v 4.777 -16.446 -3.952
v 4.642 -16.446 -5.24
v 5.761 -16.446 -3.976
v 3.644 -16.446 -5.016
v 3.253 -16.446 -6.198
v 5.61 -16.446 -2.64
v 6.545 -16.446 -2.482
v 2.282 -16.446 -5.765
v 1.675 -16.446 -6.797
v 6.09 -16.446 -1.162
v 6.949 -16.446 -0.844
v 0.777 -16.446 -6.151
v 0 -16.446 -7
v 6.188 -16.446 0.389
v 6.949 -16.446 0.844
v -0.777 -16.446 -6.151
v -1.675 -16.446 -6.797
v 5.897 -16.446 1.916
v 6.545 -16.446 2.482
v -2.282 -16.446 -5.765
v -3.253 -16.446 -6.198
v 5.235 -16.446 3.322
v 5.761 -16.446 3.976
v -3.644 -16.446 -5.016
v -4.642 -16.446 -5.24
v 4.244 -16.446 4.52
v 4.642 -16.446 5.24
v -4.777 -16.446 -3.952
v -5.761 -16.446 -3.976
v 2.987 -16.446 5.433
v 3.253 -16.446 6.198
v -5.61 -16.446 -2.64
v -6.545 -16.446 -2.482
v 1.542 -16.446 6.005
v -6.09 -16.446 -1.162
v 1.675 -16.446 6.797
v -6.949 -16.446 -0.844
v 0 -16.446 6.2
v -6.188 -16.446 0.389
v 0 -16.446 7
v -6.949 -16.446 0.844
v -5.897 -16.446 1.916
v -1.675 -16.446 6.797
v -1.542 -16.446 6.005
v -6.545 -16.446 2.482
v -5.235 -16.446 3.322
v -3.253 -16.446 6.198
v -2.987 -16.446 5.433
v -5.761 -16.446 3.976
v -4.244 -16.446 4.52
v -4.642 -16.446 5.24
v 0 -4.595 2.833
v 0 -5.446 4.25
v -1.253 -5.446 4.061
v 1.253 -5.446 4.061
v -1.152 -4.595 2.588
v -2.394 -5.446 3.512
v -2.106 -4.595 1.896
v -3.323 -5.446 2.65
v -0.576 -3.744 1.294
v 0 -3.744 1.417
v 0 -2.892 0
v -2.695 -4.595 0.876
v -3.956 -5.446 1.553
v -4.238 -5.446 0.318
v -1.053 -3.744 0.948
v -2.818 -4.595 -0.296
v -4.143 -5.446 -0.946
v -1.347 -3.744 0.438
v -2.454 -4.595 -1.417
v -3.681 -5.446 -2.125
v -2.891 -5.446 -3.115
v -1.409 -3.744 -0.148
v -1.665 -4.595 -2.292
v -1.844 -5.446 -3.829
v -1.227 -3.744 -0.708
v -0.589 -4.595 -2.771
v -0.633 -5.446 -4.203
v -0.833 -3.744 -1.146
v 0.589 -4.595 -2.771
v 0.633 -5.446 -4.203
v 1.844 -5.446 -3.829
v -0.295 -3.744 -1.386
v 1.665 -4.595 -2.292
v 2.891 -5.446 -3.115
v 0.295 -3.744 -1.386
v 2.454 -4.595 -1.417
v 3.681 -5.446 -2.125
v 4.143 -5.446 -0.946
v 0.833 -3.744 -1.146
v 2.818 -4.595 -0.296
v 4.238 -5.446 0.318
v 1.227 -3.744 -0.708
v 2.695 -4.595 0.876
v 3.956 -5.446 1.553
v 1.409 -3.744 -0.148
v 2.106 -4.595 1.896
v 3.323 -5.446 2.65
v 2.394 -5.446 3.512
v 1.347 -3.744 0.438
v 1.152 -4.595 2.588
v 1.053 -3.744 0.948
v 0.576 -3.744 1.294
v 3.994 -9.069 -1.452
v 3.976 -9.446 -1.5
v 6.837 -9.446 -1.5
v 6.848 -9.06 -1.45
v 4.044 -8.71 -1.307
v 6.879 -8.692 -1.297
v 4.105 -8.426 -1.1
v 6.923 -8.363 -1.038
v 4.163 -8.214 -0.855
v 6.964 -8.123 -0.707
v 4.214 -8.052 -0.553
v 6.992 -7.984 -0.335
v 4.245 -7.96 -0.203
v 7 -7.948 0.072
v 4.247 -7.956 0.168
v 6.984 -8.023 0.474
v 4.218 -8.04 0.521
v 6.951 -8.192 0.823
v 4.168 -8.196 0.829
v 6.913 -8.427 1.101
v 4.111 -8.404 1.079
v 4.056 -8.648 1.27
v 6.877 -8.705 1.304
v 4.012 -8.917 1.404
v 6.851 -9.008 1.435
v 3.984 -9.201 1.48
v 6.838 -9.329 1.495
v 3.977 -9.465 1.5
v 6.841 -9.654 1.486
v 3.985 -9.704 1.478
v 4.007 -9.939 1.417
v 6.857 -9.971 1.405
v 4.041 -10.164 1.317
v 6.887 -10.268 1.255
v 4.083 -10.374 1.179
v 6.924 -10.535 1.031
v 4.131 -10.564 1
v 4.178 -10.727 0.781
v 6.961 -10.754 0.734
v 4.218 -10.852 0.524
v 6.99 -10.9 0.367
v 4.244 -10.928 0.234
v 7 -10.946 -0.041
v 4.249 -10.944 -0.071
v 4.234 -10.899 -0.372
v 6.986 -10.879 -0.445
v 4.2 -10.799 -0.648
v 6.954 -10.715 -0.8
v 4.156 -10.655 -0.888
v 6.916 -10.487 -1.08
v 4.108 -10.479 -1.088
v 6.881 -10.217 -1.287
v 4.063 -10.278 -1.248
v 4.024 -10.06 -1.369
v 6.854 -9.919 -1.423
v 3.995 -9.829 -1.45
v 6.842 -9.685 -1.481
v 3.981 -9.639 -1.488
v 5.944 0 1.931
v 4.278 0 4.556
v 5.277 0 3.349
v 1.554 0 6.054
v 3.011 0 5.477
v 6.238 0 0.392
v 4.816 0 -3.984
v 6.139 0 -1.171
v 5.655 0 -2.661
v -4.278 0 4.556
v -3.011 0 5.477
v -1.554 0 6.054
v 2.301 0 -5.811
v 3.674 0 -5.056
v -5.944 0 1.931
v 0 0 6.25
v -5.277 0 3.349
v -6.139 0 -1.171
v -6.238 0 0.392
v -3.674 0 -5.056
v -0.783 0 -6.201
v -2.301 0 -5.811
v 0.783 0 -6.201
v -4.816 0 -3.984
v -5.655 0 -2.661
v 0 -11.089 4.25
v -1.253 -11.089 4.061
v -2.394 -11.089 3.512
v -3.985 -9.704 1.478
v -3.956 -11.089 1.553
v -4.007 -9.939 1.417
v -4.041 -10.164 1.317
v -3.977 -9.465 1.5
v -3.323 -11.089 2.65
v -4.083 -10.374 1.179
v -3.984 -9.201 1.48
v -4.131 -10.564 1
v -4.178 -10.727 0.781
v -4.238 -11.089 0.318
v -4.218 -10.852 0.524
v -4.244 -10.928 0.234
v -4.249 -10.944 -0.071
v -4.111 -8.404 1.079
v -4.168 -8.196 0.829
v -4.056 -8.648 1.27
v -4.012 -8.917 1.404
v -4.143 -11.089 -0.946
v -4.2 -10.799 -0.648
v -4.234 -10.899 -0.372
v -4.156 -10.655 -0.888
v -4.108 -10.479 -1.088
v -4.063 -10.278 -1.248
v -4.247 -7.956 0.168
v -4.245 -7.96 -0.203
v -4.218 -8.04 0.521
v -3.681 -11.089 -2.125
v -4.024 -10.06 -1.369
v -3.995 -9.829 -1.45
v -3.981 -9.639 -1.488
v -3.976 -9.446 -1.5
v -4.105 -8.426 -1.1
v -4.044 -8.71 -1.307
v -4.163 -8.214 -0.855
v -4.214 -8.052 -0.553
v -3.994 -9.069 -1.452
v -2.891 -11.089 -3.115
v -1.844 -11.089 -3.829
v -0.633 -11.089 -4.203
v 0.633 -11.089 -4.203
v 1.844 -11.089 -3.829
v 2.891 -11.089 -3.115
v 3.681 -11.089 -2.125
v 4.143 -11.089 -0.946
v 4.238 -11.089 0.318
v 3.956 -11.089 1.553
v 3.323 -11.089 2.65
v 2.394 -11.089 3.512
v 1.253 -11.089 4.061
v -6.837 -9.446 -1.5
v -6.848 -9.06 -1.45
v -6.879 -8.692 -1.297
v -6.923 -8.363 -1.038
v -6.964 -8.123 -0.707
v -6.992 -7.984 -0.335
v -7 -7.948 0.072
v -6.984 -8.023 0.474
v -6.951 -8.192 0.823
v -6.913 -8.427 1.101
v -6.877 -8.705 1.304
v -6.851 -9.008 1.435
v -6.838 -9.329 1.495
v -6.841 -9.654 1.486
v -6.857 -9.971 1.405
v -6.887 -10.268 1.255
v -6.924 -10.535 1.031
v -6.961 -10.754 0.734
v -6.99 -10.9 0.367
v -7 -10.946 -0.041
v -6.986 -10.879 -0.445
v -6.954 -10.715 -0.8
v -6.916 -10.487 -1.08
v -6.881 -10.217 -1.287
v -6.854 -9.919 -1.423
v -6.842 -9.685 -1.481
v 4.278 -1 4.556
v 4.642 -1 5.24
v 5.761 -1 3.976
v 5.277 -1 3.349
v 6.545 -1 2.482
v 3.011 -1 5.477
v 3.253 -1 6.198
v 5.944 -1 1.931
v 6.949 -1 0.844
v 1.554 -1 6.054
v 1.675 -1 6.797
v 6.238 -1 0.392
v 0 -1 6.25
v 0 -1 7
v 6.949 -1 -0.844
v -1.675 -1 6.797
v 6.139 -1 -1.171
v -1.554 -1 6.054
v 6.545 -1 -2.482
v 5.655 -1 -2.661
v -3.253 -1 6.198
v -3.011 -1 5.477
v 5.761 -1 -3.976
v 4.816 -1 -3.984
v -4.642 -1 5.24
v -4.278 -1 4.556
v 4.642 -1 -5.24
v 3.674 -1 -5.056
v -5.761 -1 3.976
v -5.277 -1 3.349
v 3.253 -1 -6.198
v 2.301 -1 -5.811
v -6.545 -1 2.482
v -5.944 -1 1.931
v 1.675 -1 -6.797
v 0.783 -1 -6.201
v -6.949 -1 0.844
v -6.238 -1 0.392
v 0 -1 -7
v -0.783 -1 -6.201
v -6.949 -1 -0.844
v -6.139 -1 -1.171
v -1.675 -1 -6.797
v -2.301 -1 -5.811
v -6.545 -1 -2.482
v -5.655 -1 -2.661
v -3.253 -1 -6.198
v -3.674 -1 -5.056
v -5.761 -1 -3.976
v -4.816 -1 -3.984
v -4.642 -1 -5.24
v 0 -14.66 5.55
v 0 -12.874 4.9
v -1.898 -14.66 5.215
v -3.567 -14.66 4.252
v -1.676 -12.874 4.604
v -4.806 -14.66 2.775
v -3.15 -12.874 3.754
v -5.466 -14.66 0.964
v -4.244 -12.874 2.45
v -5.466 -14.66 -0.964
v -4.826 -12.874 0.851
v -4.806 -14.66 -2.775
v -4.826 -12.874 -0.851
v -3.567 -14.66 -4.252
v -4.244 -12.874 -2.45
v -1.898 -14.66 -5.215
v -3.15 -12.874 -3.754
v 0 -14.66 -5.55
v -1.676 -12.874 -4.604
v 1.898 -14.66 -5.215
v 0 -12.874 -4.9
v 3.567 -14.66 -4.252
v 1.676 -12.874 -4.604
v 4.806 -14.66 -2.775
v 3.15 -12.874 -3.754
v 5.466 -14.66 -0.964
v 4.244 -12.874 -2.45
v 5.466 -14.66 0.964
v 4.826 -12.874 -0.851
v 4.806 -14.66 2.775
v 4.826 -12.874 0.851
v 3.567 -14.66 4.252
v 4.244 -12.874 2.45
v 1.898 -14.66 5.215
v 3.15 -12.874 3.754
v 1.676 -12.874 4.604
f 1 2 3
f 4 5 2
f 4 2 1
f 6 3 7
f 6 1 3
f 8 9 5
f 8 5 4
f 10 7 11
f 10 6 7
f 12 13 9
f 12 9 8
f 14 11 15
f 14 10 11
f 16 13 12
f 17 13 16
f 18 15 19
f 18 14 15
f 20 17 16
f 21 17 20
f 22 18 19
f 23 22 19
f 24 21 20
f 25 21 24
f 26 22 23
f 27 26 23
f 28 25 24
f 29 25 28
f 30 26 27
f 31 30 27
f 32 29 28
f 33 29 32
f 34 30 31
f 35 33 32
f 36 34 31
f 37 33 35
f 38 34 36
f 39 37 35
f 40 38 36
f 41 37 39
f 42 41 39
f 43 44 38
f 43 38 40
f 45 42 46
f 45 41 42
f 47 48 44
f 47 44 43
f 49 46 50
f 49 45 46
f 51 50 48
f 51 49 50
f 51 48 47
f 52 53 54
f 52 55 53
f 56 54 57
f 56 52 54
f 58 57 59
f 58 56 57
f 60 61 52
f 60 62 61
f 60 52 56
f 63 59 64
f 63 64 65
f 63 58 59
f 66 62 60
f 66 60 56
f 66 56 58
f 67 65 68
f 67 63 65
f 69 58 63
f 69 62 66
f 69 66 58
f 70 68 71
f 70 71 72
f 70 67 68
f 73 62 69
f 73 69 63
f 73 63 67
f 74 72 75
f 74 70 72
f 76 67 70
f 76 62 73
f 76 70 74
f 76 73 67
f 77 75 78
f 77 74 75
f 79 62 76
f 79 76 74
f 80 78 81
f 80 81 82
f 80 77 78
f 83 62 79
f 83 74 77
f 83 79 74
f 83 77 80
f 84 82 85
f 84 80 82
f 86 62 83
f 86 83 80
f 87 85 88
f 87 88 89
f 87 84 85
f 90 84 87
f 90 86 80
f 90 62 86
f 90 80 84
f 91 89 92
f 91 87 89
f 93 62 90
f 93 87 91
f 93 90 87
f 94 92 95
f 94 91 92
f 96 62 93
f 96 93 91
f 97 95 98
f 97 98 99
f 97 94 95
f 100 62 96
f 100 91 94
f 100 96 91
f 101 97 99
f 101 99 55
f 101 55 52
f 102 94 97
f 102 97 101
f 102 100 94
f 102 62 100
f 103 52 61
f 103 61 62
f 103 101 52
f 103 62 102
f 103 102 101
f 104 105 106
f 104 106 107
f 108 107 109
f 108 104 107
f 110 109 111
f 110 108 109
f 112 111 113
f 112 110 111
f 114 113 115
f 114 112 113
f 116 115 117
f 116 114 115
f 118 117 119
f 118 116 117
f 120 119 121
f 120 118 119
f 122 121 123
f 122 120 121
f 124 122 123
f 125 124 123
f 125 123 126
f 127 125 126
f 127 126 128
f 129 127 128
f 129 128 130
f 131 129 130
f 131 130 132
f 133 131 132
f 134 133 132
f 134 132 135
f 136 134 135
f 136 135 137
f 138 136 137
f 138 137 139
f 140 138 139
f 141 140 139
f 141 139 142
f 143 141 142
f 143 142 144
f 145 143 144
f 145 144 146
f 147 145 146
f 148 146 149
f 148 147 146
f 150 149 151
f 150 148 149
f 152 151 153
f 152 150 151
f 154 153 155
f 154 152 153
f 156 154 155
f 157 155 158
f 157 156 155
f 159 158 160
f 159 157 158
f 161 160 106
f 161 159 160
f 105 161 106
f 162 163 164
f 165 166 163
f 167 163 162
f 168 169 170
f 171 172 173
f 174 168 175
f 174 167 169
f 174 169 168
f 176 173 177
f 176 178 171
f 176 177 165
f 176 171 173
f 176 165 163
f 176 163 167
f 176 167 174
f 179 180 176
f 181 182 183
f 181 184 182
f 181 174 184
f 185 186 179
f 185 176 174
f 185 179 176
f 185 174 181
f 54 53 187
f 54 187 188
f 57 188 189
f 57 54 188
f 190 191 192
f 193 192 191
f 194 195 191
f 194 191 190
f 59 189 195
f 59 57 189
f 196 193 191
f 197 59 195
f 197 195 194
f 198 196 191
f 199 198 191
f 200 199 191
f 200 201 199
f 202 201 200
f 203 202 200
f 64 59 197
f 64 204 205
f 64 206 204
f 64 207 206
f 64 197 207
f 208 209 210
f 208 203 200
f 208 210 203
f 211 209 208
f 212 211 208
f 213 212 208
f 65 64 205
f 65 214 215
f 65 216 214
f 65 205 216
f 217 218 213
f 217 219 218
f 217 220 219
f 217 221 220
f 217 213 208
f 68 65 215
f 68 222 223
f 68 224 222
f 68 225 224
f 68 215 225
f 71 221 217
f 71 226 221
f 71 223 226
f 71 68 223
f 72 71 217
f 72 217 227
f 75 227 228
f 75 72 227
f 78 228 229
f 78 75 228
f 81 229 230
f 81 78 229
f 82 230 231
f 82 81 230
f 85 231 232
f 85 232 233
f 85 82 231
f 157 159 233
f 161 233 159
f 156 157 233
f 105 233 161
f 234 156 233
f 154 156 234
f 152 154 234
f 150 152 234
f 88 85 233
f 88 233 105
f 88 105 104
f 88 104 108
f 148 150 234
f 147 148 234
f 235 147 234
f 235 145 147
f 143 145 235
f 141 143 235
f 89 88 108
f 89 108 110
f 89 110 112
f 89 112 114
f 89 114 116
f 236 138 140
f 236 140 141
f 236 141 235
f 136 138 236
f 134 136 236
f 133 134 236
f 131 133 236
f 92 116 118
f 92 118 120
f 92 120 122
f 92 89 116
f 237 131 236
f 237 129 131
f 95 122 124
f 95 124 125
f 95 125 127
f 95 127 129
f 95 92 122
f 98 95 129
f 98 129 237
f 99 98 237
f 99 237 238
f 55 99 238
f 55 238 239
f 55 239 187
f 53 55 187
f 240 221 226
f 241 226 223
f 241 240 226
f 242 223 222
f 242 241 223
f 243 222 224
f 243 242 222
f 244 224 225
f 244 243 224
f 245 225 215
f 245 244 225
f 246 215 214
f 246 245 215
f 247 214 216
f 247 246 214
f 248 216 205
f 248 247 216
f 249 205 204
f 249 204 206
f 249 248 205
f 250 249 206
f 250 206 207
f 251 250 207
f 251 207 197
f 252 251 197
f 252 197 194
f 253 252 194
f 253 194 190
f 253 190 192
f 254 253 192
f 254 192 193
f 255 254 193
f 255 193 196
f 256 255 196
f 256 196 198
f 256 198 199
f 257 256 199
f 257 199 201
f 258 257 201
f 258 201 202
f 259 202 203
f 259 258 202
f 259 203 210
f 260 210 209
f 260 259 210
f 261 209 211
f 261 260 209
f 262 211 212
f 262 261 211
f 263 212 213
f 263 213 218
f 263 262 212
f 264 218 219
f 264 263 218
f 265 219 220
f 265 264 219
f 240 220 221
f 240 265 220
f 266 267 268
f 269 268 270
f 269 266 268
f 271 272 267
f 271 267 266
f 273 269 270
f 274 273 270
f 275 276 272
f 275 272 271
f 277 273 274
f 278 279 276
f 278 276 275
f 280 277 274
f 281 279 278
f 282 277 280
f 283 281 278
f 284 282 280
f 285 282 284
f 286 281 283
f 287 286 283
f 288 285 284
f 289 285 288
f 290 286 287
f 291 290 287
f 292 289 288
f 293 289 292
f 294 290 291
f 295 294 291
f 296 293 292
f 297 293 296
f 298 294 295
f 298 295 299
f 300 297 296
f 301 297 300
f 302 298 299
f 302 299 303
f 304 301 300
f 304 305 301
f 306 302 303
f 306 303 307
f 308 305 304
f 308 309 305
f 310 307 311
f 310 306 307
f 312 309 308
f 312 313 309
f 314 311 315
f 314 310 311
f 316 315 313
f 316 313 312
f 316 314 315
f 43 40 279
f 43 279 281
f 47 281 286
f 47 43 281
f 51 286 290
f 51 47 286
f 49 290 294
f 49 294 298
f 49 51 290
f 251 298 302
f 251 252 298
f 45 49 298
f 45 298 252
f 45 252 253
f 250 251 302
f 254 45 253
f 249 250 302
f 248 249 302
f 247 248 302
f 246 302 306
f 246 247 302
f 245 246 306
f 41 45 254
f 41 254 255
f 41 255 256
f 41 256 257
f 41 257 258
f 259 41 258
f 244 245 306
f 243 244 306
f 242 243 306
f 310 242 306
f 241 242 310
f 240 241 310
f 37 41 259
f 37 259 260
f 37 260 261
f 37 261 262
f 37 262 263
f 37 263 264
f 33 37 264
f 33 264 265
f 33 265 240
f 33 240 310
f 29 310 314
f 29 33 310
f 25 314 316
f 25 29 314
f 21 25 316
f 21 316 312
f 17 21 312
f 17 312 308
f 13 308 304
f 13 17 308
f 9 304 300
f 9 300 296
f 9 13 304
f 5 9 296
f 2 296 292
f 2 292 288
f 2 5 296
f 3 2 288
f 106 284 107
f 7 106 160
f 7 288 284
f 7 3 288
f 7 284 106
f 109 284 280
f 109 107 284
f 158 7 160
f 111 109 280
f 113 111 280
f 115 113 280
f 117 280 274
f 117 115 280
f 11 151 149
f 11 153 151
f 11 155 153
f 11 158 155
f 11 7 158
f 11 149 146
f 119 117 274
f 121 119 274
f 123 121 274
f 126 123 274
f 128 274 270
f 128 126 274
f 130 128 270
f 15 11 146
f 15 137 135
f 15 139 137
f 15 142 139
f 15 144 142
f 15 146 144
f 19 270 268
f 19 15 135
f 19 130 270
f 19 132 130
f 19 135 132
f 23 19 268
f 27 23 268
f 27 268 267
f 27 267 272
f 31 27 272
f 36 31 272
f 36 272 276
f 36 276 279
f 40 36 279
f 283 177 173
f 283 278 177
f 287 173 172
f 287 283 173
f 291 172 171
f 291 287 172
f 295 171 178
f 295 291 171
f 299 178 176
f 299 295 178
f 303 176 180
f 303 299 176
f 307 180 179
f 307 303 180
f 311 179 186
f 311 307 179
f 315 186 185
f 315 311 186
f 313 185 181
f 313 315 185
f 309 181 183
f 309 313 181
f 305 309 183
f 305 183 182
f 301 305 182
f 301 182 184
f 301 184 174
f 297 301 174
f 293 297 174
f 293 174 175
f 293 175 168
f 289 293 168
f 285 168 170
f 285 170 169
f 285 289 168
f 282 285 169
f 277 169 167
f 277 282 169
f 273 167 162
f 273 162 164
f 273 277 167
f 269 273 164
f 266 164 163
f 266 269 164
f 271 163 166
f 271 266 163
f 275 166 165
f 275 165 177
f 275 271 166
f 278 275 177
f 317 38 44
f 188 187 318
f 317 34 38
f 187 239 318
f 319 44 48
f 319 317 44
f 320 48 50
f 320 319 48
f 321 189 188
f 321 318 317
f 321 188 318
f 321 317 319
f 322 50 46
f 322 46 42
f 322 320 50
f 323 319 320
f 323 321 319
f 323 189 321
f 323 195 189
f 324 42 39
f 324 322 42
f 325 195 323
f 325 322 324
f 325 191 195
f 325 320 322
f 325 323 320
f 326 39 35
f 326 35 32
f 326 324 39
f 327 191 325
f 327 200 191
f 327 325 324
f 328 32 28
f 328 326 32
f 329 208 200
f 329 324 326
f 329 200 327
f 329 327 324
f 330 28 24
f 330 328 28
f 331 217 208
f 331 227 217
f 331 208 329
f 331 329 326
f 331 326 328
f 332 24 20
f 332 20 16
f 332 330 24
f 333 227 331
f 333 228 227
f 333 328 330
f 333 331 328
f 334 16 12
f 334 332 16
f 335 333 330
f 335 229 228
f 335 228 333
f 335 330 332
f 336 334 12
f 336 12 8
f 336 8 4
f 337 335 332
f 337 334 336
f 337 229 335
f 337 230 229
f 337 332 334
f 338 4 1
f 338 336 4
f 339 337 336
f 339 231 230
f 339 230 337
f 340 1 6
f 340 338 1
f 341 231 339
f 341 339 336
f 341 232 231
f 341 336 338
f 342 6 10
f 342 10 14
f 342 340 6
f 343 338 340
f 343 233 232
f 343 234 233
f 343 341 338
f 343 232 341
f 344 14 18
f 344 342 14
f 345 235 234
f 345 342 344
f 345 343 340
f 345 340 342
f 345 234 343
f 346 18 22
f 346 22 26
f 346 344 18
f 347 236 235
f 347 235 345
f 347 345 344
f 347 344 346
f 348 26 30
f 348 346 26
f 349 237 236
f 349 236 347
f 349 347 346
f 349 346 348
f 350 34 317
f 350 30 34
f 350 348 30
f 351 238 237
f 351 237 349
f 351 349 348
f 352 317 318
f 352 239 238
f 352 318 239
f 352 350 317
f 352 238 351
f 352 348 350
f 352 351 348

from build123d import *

# Parameters (mm, degrees)
CUT_EXTRUDE1_DEPTH      = 20.195683783
CUT_EXTRUDE1_DEPTH_BACK = 20.195683783
SKETCH2_R               = 1.5


with BuildPart() as part:
    # Sketch1 → Revolve1 (revolve)
    with BuildSketch(Plane.XY, mode=Mode.PRIVATE) as revolve1_sk:
        Polygon((0, 0), (-6.25, 0), (-6.25, -1), (-7, -1), (-7, -16.446102149), (-6.2, -16.446102149), (-4.25, -11.088521181), (-4.25, -5.446102149), (0, -2.892444518), align=None)
    revolve(revolve1_sk.sketch.rotate(Axis((0, 0, 0), (0, -1, 0)), 270), axis=Axis((0, 0, 0), (0, -1, 0)))

    # Sketch2 → Cut-Extrude1 (cut, two sides: drawn at the far end of the back side and taken through both)
    with BuildSketch(Plane(origin=(0, 0, 0), x_dir=(0, 0, -1), z_dir=(1, 0, 0)).offset(-CUT_EXTRUDE1_DEPTH_BACK)):
        with Locations((0, -9.446102149)):
            Circle(SKETCH2_R)
    extrude(amount=CUT_EXTRUDE1_DEPTH + CUT_EXTRUDE1_DEPTH_BACK, mode=Mode.SUBTRACT)


solid = part.part
